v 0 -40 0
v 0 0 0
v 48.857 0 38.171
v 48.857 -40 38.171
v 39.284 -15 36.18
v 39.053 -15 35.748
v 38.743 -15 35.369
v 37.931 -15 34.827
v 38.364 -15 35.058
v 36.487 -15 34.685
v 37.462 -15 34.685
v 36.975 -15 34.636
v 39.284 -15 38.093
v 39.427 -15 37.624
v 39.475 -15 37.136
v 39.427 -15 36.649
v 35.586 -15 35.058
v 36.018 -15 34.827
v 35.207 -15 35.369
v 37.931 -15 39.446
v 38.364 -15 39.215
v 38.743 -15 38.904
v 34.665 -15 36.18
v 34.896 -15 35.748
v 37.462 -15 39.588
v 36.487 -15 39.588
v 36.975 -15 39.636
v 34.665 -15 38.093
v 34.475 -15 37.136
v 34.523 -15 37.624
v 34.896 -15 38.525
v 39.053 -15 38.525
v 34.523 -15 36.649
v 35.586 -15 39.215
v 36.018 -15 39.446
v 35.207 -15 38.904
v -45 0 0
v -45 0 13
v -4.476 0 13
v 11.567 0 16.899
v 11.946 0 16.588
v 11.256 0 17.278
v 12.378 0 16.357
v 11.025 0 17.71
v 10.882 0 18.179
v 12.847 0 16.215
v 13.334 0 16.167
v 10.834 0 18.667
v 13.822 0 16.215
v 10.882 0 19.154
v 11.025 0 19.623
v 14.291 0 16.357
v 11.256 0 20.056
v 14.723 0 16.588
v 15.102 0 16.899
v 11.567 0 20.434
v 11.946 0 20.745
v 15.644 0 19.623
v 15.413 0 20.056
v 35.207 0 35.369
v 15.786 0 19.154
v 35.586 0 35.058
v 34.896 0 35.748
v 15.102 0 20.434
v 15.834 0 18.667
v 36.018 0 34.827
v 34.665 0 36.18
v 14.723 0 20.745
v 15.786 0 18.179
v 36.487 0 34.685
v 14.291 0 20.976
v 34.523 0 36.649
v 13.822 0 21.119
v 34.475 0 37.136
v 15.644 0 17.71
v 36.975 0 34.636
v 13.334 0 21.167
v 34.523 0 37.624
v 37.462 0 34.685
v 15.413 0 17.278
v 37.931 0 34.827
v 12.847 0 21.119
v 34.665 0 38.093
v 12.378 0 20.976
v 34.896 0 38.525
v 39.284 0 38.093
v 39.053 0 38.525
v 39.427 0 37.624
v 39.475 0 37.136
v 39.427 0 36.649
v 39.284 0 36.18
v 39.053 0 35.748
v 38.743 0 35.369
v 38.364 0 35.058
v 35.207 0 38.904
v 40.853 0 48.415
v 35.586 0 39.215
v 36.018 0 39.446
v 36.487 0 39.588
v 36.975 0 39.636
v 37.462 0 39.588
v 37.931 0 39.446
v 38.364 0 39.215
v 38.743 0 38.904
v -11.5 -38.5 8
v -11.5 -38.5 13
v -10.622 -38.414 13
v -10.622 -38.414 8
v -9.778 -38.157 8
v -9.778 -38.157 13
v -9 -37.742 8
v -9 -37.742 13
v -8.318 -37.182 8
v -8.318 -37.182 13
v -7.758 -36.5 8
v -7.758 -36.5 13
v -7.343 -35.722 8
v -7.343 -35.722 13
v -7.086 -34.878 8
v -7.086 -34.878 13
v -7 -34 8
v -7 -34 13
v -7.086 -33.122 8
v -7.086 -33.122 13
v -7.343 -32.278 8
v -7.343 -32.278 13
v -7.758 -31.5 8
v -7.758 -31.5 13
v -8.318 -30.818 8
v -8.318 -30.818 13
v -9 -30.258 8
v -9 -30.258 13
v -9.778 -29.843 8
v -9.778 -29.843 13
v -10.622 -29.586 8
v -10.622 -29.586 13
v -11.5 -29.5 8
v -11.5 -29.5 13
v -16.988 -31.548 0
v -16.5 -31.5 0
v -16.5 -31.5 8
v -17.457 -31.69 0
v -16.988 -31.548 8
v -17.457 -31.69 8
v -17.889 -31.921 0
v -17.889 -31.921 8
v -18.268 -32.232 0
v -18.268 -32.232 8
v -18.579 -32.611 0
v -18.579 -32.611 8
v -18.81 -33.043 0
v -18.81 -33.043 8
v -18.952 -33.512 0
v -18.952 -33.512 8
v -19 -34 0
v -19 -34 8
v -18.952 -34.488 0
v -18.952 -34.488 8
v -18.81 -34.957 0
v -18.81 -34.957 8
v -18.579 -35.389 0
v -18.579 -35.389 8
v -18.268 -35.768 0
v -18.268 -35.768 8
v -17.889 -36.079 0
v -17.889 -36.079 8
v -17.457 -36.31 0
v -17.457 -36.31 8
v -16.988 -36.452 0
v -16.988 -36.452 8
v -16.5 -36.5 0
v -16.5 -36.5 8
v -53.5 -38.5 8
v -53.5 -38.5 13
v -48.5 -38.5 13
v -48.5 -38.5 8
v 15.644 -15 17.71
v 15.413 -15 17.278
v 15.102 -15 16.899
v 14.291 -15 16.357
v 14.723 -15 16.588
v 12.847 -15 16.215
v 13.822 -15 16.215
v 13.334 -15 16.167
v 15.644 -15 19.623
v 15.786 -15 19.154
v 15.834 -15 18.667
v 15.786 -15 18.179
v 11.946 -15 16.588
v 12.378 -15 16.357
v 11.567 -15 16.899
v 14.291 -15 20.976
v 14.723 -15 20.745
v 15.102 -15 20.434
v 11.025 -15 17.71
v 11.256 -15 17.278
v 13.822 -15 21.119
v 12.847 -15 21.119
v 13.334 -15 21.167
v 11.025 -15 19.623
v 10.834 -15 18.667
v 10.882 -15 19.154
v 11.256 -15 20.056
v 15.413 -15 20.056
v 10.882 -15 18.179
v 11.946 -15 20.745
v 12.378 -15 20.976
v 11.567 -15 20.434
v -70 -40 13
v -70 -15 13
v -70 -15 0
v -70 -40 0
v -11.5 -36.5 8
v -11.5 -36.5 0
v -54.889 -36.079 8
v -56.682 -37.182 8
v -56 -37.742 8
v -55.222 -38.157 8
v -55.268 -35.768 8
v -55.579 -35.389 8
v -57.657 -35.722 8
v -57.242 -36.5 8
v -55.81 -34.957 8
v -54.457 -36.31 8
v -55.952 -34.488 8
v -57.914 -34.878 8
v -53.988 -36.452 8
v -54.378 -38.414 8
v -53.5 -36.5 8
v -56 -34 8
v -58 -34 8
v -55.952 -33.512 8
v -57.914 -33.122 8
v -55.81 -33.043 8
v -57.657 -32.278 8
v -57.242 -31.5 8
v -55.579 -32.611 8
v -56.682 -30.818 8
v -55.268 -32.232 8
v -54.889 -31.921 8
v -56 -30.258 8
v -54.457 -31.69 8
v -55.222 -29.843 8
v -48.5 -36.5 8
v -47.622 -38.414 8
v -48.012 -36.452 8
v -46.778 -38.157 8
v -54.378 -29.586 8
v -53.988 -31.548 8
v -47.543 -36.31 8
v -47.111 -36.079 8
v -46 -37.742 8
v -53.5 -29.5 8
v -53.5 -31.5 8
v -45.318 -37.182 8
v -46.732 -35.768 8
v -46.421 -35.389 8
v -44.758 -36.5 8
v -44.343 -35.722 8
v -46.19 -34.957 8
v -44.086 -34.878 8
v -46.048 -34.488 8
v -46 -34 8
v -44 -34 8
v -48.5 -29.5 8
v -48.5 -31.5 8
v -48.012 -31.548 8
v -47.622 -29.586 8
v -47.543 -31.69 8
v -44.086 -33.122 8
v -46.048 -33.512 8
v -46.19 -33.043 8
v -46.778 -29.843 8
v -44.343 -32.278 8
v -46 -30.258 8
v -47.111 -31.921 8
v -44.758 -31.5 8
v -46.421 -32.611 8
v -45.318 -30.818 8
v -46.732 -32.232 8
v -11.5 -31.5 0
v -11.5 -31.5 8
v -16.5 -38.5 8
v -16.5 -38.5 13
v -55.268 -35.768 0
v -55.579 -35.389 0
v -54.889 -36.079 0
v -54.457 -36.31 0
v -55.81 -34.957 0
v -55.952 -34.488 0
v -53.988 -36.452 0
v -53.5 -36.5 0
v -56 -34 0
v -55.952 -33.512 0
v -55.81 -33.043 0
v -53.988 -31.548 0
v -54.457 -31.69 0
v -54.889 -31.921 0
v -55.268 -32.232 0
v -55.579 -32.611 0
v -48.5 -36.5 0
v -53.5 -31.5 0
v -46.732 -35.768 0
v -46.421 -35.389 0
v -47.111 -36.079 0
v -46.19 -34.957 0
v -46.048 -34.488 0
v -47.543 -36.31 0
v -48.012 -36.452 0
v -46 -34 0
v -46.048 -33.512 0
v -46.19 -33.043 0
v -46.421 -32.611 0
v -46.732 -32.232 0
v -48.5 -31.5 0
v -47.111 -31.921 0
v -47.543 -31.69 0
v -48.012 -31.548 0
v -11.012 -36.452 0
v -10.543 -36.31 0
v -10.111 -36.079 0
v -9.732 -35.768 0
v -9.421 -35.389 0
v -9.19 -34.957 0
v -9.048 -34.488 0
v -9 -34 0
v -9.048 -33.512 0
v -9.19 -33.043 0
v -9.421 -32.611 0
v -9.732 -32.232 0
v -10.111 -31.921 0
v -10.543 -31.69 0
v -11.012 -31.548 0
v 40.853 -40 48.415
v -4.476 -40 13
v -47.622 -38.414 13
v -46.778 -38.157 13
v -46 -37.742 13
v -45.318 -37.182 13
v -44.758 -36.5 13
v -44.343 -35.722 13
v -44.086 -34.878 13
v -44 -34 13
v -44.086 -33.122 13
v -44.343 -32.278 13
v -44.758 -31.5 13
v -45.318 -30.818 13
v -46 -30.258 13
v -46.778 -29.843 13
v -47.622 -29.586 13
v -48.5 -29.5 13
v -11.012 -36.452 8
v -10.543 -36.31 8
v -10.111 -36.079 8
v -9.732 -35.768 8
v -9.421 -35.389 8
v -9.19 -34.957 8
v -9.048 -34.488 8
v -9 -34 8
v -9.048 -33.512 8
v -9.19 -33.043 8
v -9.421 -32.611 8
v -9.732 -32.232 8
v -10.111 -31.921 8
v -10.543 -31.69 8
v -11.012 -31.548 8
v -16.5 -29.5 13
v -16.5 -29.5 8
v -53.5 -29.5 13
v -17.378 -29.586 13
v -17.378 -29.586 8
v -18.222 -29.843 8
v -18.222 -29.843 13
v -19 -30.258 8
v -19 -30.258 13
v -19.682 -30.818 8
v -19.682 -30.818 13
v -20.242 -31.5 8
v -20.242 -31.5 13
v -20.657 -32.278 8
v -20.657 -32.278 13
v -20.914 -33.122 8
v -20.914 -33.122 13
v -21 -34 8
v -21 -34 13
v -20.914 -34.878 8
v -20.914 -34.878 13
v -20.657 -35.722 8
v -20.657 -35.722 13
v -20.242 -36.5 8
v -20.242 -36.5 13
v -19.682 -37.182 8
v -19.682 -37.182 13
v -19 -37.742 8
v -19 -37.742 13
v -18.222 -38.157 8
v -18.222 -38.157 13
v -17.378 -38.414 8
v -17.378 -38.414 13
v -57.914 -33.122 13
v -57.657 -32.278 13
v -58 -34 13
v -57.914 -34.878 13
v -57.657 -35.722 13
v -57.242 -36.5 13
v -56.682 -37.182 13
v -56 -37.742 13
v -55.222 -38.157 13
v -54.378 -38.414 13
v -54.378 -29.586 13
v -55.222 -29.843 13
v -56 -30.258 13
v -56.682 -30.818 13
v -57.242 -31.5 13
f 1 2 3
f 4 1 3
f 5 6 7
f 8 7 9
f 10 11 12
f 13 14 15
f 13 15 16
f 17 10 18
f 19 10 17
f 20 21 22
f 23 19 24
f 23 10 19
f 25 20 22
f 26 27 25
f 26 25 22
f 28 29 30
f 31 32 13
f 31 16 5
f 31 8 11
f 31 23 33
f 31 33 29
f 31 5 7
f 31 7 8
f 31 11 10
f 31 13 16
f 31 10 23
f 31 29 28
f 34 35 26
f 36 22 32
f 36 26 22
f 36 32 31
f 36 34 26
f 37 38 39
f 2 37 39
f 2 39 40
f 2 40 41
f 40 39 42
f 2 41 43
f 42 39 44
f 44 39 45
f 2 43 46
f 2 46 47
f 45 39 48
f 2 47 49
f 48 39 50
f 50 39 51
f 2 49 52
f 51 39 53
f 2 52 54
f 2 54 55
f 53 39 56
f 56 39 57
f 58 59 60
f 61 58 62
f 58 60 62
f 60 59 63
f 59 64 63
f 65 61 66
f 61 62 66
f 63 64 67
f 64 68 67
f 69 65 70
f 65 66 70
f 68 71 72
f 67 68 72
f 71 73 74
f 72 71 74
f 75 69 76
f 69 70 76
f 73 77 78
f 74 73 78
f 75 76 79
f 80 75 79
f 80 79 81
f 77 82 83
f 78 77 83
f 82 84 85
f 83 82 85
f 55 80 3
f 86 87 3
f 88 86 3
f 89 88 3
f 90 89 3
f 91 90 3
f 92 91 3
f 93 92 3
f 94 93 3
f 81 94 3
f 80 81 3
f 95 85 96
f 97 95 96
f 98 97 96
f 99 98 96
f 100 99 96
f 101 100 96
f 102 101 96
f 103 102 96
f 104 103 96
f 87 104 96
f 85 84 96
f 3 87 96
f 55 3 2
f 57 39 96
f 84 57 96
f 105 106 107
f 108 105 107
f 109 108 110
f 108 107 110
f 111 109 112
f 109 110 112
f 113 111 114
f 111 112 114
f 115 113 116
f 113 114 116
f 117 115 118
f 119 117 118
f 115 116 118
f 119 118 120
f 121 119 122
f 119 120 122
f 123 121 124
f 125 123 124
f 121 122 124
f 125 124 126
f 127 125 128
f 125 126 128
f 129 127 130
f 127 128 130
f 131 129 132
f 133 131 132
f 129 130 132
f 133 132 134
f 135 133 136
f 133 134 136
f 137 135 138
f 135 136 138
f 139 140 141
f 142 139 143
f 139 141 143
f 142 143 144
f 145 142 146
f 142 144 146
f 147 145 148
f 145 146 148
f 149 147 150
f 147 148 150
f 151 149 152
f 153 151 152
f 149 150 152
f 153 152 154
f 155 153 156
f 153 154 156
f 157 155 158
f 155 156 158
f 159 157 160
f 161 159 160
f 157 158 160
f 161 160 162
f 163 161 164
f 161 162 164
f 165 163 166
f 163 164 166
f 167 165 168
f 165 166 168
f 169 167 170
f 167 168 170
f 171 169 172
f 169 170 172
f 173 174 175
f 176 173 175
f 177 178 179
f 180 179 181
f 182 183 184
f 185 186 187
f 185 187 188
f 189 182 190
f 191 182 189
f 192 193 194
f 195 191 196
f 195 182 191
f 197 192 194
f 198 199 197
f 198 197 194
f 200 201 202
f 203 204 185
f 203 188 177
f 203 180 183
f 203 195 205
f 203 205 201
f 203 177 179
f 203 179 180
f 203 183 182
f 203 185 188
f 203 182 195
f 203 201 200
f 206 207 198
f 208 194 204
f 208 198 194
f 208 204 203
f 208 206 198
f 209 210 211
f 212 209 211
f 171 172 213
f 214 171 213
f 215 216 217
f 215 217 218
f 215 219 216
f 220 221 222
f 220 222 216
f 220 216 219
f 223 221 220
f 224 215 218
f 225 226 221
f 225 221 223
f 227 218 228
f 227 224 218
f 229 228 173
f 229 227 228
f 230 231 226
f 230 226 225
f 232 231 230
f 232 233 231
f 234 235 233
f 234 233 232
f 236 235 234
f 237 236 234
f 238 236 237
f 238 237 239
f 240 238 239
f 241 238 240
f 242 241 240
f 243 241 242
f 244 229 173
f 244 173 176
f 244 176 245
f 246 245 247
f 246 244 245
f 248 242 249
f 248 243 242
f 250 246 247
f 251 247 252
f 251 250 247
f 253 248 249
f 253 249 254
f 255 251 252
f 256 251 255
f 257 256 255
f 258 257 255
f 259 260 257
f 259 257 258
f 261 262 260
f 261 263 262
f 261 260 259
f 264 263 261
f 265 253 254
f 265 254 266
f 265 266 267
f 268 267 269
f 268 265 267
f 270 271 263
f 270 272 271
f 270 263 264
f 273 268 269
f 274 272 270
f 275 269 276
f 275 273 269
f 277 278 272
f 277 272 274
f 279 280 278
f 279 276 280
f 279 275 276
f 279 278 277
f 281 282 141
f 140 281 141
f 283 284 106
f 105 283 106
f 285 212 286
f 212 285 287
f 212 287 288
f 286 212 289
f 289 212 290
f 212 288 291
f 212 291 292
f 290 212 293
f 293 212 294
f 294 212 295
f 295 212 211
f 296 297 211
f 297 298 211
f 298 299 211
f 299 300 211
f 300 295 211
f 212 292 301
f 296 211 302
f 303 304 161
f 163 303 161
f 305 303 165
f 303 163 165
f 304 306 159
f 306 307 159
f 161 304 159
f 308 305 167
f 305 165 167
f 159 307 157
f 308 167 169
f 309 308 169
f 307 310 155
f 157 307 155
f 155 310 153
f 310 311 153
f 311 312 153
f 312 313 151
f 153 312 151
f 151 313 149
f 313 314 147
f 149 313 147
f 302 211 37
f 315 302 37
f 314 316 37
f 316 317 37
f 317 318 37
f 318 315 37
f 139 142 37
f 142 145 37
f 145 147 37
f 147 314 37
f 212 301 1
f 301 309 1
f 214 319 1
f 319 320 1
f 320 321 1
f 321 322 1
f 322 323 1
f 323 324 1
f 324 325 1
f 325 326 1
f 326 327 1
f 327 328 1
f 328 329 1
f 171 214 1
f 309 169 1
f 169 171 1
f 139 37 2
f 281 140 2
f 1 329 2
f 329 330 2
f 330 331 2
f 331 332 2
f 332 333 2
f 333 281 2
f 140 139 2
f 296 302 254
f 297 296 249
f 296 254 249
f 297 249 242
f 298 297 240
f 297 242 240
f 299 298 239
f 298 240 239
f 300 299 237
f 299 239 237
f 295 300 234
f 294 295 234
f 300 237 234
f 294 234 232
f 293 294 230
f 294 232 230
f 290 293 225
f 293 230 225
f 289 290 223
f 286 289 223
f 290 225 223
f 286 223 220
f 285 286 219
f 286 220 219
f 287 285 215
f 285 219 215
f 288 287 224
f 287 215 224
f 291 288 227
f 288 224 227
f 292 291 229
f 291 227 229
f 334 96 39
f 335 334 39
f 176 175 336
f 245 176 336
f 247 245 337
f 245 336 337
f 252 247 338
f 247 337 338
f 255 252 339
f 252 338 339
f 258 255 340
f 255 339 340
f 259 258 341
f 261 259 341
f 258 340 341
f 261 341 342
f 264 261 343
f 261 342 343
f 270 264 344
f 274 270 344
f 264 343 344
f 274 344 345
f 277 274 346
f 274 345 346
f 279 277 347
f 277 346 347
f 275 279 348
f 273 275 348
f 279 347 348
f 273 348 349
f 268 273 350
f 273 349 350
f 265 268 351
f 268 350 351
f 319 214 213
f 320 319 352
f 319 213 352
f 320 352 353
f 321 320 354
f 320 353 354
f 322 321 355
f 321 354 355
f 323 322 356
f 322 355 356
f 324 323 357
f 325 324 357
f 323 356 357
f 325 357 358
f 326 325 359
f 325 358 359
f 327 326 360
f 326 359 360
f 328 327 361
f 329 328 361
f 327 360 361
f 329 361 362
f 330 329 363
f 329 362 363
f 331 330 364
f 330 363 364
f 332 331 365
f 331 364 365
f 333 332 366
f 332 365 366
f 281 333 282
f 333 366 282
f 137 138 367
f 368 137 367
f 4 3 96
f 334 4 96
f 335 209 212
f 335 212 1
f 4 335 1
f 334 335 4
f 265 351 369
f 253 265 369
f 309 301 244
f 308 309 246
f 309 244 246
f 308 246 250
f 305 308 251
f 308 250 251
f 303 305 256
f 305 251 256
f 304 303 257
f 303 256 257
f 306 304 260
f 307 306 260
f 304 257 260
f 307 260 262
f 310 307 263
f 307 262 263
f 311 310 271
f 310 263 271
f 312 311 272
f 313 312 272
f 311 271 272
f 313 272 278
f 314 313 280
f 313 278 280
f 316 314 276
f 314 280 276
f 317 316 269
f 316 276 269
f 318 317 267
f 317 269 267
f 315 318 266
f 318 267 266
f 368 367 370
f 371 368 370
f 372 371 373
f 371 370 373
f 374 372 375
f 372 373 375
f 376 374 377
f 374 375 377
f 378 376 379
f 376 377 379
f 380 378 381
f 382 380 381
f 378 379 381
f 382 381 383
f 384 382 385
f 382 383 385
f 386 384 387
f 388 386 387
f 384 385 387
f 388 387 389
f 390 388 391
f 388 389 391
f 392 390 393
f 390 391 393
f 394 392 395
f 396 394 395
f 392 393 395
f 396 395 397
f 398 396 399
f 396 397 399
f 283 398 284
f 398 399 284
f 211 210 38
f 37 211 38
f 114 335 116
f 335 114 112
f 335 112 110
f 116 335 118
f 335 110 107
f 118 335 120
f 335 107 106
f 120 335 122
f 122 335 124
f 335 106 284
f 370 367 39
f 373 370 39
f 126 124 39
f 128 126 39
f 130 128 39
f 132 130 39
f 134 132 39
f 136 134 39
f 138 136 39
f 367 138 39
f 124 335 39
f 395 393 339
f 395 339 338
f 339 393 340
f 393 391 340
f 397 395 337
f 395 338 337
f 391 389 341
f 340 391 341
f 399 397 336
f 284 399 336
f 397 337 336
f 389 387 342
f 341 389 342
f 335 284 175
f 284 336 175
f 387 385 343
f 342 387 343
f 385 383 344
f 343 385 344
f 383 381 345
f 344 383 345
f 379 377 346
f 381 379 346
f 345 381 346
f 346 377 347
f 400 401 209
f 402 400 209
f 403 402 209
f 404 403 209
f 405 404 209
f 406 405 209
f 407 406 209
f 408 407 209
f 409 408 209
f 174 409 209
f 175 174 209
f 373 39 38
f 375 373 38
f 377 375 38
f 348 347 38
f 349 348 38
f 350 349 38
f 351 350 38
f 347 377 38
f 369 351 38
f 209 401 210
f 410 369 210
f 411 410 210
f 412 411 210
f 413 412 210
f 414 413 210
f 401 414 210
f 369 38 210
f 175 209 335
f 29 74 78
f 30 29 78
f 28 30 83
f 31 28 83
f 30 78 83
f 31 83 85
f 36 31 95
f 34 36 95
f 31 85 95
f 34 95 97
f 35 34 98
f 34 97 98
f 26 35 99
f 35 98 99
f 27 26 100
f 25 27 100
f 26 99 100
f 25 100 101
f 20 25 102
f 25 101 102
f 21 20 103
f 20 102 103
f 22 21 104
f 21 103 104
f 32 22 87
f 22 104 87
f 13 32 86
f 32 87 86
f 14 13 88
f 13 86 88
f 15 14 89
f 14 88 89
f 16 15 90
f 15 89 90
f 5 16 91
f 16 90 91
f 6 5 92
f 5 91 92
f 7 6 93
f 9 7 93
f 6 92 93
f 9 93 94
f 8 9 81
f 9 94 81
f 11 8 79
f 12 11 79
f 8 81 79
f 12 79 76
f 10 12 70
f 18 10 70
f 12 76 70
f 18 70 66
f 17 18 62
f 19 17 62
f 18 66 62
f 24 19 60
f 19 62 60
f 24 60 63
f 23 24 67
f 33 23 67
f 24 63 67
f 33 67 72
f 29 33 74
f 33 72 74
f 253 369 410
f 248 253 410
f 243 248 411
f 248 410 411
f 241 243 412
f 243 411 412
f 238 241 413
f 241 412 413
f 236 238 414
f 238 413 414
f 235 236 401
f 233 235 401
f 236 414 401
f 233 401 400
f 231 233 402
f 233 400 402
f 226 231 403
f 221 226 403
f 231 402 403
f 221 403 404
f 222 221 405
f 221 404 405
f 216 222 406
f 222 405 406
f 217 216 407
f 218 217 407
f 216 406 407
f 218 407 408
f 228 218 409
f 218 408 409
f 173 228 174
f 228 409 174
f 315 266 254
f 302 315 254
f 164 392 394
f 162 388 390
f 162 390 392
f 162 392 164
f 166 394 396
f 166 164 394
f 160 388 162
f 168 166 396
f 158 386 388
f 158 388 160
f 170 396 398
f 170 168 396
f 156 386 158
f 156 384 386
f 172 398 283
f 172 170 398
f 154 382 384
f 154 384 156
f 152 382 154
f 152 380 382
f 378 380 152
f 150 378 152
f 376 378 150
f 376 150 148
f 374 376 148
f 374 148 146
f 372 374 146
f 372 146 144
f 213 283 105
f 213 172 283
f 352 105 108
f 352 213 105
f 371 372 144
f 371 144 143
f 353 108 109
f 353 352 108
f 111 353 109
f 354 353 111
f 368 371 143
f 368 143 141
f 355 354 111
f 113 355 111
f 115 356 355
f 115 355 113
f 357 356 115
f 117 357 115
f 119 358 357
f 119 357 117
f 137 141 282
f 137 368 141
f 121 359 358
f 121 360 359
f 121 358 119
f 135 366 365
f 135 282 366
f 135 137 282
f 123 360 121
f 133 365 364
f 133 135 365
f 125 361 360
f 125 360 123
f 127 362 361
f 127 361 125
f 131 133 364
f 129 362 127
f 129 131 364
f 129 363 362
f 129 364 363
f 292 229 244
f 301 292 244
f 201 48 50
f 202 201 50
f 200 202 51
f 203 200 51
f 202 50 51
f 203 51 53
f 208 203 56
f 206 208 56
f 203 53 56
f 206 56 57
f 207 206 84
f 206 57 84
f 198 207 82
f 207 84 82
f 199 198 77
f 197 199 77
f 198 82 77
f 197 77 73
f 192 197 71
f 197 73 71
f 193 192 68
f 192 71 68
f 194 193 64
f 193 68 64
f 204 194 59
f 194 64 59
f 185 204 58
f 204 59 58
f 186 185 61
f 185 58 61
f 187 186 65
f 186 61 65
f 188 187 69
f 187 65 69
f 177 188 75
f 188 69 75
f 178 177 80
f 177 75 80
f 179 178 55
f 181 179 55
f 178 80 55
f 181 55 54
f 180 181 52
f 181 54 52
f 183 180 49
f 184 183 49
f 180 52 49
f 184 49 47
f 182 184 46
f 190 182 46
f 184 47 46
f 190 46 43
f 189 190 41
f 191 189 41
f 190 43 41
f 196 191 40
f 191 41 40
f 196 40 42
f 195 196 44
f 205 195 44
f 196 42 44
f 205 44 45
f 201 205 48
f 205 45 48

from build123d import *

# Parameters (mm, degrees)
F1_DEPTH = 40
F3_DEPTH = 5
F5_DEPTH = 25
F7_DEPTH = 25
F8_R     = 2.5
F9_DEPTH = 15


with BuildPart() as f1:
    # F0 (on Front) → F1 (new body)
    with BuildSketch(Plane.XZ):
        Polygon((-70, 13), (-70, 0), (0, 0), (48.856667, 38.171011), (40.853068, 48.415151), (-4.476259, 13), align=None)
    extrude(amount=F1_DEPTH)

    # F2 (on face) → F3 (cut)
    with BuildSketch(Plane.XY.offset(13)):
        with BuildLine():
            Line((-16.5, -38.5), (-11.5, -38.5))
            ThreePointArc((-11.5, -38.5), (-7, -34), (-11.5, -29.5))
            Line((-11.5, -29.5), (-16.5, -29.5))
            ThreePointArc((-16.5, -29.5), (-21, -34), (-16.5, -38.5))
        make_face()
        with BuildLine():
            Line((-48.5, -29.5), (-53.5, -29.5))
            ThreePointArc((-53.5, -29.5), (-58, -34), (-53.5, -38.5))
            Line((-53.5, -38.5), (-48.5, -38.5))
            ThreePointArc((-48.5, -38.5), (-44, -34), (-48.5, -29.5))
        make_face()
    extrude(amount=-F3_DEPTH, mode=Mode.SUBTRACT)

    # F4 (on face) → F5 (cut)
    with BuildSketch(Plane.XY.offset(13)):
        with BuildLine():
            Line((-53.5, -36.5), (-48.5, -36.5))
            ThreePointArc((-48.5, -36.5), (-46, -34), (-48.5, -31.5))
            Line((-48.5, -31.5), (-53.5, -31.5))
            ThreePointArc((-53.5, -31.5), (-56, -34), (-53.5, -36.5))
        make_face()
        with BuildLine():
            Line((-11.5, -31.5), (-16.5, -31.5))
            ThreePointArc((-16.5, -31.5), (-19, -34), (-16.5, -36.5))
            Line((-16.5, -36.5), (-11.5, -36.5))
            ThreePointArc((-11.5, -36.5), (-9, -34), (-11.5, -31.5))
        make_face()
    extrude(amount=-F5_DEPTH, mode=Mode.SUBTRACT)

    # F6 (on face) → F7 (cut)
    with BuildSketch(Plane.XY.offset(13)):
        Polygon((-70, 0), (-70, -15), (-45, 0), align=None)
    extrude(amount=-F7_DEPTH, mode=Mode.SUBTRACT)

    # F8 (on face) → F9 (cut)
    with BuildSketch(Plane(origin=(0, 0, 0), x_dir=(-1, 0, 0), z_dir=(0, 1, 0))):
        with Locations((-36.97476, 37.136467)):
            Circle(F8_R)
        with Locations((-13.334437, 18.666622)):
            Circle(F8_R)
    extrude(amount=-F9_DEPTH, mode=Mode.SUBTRACT)


solid = f1.part
